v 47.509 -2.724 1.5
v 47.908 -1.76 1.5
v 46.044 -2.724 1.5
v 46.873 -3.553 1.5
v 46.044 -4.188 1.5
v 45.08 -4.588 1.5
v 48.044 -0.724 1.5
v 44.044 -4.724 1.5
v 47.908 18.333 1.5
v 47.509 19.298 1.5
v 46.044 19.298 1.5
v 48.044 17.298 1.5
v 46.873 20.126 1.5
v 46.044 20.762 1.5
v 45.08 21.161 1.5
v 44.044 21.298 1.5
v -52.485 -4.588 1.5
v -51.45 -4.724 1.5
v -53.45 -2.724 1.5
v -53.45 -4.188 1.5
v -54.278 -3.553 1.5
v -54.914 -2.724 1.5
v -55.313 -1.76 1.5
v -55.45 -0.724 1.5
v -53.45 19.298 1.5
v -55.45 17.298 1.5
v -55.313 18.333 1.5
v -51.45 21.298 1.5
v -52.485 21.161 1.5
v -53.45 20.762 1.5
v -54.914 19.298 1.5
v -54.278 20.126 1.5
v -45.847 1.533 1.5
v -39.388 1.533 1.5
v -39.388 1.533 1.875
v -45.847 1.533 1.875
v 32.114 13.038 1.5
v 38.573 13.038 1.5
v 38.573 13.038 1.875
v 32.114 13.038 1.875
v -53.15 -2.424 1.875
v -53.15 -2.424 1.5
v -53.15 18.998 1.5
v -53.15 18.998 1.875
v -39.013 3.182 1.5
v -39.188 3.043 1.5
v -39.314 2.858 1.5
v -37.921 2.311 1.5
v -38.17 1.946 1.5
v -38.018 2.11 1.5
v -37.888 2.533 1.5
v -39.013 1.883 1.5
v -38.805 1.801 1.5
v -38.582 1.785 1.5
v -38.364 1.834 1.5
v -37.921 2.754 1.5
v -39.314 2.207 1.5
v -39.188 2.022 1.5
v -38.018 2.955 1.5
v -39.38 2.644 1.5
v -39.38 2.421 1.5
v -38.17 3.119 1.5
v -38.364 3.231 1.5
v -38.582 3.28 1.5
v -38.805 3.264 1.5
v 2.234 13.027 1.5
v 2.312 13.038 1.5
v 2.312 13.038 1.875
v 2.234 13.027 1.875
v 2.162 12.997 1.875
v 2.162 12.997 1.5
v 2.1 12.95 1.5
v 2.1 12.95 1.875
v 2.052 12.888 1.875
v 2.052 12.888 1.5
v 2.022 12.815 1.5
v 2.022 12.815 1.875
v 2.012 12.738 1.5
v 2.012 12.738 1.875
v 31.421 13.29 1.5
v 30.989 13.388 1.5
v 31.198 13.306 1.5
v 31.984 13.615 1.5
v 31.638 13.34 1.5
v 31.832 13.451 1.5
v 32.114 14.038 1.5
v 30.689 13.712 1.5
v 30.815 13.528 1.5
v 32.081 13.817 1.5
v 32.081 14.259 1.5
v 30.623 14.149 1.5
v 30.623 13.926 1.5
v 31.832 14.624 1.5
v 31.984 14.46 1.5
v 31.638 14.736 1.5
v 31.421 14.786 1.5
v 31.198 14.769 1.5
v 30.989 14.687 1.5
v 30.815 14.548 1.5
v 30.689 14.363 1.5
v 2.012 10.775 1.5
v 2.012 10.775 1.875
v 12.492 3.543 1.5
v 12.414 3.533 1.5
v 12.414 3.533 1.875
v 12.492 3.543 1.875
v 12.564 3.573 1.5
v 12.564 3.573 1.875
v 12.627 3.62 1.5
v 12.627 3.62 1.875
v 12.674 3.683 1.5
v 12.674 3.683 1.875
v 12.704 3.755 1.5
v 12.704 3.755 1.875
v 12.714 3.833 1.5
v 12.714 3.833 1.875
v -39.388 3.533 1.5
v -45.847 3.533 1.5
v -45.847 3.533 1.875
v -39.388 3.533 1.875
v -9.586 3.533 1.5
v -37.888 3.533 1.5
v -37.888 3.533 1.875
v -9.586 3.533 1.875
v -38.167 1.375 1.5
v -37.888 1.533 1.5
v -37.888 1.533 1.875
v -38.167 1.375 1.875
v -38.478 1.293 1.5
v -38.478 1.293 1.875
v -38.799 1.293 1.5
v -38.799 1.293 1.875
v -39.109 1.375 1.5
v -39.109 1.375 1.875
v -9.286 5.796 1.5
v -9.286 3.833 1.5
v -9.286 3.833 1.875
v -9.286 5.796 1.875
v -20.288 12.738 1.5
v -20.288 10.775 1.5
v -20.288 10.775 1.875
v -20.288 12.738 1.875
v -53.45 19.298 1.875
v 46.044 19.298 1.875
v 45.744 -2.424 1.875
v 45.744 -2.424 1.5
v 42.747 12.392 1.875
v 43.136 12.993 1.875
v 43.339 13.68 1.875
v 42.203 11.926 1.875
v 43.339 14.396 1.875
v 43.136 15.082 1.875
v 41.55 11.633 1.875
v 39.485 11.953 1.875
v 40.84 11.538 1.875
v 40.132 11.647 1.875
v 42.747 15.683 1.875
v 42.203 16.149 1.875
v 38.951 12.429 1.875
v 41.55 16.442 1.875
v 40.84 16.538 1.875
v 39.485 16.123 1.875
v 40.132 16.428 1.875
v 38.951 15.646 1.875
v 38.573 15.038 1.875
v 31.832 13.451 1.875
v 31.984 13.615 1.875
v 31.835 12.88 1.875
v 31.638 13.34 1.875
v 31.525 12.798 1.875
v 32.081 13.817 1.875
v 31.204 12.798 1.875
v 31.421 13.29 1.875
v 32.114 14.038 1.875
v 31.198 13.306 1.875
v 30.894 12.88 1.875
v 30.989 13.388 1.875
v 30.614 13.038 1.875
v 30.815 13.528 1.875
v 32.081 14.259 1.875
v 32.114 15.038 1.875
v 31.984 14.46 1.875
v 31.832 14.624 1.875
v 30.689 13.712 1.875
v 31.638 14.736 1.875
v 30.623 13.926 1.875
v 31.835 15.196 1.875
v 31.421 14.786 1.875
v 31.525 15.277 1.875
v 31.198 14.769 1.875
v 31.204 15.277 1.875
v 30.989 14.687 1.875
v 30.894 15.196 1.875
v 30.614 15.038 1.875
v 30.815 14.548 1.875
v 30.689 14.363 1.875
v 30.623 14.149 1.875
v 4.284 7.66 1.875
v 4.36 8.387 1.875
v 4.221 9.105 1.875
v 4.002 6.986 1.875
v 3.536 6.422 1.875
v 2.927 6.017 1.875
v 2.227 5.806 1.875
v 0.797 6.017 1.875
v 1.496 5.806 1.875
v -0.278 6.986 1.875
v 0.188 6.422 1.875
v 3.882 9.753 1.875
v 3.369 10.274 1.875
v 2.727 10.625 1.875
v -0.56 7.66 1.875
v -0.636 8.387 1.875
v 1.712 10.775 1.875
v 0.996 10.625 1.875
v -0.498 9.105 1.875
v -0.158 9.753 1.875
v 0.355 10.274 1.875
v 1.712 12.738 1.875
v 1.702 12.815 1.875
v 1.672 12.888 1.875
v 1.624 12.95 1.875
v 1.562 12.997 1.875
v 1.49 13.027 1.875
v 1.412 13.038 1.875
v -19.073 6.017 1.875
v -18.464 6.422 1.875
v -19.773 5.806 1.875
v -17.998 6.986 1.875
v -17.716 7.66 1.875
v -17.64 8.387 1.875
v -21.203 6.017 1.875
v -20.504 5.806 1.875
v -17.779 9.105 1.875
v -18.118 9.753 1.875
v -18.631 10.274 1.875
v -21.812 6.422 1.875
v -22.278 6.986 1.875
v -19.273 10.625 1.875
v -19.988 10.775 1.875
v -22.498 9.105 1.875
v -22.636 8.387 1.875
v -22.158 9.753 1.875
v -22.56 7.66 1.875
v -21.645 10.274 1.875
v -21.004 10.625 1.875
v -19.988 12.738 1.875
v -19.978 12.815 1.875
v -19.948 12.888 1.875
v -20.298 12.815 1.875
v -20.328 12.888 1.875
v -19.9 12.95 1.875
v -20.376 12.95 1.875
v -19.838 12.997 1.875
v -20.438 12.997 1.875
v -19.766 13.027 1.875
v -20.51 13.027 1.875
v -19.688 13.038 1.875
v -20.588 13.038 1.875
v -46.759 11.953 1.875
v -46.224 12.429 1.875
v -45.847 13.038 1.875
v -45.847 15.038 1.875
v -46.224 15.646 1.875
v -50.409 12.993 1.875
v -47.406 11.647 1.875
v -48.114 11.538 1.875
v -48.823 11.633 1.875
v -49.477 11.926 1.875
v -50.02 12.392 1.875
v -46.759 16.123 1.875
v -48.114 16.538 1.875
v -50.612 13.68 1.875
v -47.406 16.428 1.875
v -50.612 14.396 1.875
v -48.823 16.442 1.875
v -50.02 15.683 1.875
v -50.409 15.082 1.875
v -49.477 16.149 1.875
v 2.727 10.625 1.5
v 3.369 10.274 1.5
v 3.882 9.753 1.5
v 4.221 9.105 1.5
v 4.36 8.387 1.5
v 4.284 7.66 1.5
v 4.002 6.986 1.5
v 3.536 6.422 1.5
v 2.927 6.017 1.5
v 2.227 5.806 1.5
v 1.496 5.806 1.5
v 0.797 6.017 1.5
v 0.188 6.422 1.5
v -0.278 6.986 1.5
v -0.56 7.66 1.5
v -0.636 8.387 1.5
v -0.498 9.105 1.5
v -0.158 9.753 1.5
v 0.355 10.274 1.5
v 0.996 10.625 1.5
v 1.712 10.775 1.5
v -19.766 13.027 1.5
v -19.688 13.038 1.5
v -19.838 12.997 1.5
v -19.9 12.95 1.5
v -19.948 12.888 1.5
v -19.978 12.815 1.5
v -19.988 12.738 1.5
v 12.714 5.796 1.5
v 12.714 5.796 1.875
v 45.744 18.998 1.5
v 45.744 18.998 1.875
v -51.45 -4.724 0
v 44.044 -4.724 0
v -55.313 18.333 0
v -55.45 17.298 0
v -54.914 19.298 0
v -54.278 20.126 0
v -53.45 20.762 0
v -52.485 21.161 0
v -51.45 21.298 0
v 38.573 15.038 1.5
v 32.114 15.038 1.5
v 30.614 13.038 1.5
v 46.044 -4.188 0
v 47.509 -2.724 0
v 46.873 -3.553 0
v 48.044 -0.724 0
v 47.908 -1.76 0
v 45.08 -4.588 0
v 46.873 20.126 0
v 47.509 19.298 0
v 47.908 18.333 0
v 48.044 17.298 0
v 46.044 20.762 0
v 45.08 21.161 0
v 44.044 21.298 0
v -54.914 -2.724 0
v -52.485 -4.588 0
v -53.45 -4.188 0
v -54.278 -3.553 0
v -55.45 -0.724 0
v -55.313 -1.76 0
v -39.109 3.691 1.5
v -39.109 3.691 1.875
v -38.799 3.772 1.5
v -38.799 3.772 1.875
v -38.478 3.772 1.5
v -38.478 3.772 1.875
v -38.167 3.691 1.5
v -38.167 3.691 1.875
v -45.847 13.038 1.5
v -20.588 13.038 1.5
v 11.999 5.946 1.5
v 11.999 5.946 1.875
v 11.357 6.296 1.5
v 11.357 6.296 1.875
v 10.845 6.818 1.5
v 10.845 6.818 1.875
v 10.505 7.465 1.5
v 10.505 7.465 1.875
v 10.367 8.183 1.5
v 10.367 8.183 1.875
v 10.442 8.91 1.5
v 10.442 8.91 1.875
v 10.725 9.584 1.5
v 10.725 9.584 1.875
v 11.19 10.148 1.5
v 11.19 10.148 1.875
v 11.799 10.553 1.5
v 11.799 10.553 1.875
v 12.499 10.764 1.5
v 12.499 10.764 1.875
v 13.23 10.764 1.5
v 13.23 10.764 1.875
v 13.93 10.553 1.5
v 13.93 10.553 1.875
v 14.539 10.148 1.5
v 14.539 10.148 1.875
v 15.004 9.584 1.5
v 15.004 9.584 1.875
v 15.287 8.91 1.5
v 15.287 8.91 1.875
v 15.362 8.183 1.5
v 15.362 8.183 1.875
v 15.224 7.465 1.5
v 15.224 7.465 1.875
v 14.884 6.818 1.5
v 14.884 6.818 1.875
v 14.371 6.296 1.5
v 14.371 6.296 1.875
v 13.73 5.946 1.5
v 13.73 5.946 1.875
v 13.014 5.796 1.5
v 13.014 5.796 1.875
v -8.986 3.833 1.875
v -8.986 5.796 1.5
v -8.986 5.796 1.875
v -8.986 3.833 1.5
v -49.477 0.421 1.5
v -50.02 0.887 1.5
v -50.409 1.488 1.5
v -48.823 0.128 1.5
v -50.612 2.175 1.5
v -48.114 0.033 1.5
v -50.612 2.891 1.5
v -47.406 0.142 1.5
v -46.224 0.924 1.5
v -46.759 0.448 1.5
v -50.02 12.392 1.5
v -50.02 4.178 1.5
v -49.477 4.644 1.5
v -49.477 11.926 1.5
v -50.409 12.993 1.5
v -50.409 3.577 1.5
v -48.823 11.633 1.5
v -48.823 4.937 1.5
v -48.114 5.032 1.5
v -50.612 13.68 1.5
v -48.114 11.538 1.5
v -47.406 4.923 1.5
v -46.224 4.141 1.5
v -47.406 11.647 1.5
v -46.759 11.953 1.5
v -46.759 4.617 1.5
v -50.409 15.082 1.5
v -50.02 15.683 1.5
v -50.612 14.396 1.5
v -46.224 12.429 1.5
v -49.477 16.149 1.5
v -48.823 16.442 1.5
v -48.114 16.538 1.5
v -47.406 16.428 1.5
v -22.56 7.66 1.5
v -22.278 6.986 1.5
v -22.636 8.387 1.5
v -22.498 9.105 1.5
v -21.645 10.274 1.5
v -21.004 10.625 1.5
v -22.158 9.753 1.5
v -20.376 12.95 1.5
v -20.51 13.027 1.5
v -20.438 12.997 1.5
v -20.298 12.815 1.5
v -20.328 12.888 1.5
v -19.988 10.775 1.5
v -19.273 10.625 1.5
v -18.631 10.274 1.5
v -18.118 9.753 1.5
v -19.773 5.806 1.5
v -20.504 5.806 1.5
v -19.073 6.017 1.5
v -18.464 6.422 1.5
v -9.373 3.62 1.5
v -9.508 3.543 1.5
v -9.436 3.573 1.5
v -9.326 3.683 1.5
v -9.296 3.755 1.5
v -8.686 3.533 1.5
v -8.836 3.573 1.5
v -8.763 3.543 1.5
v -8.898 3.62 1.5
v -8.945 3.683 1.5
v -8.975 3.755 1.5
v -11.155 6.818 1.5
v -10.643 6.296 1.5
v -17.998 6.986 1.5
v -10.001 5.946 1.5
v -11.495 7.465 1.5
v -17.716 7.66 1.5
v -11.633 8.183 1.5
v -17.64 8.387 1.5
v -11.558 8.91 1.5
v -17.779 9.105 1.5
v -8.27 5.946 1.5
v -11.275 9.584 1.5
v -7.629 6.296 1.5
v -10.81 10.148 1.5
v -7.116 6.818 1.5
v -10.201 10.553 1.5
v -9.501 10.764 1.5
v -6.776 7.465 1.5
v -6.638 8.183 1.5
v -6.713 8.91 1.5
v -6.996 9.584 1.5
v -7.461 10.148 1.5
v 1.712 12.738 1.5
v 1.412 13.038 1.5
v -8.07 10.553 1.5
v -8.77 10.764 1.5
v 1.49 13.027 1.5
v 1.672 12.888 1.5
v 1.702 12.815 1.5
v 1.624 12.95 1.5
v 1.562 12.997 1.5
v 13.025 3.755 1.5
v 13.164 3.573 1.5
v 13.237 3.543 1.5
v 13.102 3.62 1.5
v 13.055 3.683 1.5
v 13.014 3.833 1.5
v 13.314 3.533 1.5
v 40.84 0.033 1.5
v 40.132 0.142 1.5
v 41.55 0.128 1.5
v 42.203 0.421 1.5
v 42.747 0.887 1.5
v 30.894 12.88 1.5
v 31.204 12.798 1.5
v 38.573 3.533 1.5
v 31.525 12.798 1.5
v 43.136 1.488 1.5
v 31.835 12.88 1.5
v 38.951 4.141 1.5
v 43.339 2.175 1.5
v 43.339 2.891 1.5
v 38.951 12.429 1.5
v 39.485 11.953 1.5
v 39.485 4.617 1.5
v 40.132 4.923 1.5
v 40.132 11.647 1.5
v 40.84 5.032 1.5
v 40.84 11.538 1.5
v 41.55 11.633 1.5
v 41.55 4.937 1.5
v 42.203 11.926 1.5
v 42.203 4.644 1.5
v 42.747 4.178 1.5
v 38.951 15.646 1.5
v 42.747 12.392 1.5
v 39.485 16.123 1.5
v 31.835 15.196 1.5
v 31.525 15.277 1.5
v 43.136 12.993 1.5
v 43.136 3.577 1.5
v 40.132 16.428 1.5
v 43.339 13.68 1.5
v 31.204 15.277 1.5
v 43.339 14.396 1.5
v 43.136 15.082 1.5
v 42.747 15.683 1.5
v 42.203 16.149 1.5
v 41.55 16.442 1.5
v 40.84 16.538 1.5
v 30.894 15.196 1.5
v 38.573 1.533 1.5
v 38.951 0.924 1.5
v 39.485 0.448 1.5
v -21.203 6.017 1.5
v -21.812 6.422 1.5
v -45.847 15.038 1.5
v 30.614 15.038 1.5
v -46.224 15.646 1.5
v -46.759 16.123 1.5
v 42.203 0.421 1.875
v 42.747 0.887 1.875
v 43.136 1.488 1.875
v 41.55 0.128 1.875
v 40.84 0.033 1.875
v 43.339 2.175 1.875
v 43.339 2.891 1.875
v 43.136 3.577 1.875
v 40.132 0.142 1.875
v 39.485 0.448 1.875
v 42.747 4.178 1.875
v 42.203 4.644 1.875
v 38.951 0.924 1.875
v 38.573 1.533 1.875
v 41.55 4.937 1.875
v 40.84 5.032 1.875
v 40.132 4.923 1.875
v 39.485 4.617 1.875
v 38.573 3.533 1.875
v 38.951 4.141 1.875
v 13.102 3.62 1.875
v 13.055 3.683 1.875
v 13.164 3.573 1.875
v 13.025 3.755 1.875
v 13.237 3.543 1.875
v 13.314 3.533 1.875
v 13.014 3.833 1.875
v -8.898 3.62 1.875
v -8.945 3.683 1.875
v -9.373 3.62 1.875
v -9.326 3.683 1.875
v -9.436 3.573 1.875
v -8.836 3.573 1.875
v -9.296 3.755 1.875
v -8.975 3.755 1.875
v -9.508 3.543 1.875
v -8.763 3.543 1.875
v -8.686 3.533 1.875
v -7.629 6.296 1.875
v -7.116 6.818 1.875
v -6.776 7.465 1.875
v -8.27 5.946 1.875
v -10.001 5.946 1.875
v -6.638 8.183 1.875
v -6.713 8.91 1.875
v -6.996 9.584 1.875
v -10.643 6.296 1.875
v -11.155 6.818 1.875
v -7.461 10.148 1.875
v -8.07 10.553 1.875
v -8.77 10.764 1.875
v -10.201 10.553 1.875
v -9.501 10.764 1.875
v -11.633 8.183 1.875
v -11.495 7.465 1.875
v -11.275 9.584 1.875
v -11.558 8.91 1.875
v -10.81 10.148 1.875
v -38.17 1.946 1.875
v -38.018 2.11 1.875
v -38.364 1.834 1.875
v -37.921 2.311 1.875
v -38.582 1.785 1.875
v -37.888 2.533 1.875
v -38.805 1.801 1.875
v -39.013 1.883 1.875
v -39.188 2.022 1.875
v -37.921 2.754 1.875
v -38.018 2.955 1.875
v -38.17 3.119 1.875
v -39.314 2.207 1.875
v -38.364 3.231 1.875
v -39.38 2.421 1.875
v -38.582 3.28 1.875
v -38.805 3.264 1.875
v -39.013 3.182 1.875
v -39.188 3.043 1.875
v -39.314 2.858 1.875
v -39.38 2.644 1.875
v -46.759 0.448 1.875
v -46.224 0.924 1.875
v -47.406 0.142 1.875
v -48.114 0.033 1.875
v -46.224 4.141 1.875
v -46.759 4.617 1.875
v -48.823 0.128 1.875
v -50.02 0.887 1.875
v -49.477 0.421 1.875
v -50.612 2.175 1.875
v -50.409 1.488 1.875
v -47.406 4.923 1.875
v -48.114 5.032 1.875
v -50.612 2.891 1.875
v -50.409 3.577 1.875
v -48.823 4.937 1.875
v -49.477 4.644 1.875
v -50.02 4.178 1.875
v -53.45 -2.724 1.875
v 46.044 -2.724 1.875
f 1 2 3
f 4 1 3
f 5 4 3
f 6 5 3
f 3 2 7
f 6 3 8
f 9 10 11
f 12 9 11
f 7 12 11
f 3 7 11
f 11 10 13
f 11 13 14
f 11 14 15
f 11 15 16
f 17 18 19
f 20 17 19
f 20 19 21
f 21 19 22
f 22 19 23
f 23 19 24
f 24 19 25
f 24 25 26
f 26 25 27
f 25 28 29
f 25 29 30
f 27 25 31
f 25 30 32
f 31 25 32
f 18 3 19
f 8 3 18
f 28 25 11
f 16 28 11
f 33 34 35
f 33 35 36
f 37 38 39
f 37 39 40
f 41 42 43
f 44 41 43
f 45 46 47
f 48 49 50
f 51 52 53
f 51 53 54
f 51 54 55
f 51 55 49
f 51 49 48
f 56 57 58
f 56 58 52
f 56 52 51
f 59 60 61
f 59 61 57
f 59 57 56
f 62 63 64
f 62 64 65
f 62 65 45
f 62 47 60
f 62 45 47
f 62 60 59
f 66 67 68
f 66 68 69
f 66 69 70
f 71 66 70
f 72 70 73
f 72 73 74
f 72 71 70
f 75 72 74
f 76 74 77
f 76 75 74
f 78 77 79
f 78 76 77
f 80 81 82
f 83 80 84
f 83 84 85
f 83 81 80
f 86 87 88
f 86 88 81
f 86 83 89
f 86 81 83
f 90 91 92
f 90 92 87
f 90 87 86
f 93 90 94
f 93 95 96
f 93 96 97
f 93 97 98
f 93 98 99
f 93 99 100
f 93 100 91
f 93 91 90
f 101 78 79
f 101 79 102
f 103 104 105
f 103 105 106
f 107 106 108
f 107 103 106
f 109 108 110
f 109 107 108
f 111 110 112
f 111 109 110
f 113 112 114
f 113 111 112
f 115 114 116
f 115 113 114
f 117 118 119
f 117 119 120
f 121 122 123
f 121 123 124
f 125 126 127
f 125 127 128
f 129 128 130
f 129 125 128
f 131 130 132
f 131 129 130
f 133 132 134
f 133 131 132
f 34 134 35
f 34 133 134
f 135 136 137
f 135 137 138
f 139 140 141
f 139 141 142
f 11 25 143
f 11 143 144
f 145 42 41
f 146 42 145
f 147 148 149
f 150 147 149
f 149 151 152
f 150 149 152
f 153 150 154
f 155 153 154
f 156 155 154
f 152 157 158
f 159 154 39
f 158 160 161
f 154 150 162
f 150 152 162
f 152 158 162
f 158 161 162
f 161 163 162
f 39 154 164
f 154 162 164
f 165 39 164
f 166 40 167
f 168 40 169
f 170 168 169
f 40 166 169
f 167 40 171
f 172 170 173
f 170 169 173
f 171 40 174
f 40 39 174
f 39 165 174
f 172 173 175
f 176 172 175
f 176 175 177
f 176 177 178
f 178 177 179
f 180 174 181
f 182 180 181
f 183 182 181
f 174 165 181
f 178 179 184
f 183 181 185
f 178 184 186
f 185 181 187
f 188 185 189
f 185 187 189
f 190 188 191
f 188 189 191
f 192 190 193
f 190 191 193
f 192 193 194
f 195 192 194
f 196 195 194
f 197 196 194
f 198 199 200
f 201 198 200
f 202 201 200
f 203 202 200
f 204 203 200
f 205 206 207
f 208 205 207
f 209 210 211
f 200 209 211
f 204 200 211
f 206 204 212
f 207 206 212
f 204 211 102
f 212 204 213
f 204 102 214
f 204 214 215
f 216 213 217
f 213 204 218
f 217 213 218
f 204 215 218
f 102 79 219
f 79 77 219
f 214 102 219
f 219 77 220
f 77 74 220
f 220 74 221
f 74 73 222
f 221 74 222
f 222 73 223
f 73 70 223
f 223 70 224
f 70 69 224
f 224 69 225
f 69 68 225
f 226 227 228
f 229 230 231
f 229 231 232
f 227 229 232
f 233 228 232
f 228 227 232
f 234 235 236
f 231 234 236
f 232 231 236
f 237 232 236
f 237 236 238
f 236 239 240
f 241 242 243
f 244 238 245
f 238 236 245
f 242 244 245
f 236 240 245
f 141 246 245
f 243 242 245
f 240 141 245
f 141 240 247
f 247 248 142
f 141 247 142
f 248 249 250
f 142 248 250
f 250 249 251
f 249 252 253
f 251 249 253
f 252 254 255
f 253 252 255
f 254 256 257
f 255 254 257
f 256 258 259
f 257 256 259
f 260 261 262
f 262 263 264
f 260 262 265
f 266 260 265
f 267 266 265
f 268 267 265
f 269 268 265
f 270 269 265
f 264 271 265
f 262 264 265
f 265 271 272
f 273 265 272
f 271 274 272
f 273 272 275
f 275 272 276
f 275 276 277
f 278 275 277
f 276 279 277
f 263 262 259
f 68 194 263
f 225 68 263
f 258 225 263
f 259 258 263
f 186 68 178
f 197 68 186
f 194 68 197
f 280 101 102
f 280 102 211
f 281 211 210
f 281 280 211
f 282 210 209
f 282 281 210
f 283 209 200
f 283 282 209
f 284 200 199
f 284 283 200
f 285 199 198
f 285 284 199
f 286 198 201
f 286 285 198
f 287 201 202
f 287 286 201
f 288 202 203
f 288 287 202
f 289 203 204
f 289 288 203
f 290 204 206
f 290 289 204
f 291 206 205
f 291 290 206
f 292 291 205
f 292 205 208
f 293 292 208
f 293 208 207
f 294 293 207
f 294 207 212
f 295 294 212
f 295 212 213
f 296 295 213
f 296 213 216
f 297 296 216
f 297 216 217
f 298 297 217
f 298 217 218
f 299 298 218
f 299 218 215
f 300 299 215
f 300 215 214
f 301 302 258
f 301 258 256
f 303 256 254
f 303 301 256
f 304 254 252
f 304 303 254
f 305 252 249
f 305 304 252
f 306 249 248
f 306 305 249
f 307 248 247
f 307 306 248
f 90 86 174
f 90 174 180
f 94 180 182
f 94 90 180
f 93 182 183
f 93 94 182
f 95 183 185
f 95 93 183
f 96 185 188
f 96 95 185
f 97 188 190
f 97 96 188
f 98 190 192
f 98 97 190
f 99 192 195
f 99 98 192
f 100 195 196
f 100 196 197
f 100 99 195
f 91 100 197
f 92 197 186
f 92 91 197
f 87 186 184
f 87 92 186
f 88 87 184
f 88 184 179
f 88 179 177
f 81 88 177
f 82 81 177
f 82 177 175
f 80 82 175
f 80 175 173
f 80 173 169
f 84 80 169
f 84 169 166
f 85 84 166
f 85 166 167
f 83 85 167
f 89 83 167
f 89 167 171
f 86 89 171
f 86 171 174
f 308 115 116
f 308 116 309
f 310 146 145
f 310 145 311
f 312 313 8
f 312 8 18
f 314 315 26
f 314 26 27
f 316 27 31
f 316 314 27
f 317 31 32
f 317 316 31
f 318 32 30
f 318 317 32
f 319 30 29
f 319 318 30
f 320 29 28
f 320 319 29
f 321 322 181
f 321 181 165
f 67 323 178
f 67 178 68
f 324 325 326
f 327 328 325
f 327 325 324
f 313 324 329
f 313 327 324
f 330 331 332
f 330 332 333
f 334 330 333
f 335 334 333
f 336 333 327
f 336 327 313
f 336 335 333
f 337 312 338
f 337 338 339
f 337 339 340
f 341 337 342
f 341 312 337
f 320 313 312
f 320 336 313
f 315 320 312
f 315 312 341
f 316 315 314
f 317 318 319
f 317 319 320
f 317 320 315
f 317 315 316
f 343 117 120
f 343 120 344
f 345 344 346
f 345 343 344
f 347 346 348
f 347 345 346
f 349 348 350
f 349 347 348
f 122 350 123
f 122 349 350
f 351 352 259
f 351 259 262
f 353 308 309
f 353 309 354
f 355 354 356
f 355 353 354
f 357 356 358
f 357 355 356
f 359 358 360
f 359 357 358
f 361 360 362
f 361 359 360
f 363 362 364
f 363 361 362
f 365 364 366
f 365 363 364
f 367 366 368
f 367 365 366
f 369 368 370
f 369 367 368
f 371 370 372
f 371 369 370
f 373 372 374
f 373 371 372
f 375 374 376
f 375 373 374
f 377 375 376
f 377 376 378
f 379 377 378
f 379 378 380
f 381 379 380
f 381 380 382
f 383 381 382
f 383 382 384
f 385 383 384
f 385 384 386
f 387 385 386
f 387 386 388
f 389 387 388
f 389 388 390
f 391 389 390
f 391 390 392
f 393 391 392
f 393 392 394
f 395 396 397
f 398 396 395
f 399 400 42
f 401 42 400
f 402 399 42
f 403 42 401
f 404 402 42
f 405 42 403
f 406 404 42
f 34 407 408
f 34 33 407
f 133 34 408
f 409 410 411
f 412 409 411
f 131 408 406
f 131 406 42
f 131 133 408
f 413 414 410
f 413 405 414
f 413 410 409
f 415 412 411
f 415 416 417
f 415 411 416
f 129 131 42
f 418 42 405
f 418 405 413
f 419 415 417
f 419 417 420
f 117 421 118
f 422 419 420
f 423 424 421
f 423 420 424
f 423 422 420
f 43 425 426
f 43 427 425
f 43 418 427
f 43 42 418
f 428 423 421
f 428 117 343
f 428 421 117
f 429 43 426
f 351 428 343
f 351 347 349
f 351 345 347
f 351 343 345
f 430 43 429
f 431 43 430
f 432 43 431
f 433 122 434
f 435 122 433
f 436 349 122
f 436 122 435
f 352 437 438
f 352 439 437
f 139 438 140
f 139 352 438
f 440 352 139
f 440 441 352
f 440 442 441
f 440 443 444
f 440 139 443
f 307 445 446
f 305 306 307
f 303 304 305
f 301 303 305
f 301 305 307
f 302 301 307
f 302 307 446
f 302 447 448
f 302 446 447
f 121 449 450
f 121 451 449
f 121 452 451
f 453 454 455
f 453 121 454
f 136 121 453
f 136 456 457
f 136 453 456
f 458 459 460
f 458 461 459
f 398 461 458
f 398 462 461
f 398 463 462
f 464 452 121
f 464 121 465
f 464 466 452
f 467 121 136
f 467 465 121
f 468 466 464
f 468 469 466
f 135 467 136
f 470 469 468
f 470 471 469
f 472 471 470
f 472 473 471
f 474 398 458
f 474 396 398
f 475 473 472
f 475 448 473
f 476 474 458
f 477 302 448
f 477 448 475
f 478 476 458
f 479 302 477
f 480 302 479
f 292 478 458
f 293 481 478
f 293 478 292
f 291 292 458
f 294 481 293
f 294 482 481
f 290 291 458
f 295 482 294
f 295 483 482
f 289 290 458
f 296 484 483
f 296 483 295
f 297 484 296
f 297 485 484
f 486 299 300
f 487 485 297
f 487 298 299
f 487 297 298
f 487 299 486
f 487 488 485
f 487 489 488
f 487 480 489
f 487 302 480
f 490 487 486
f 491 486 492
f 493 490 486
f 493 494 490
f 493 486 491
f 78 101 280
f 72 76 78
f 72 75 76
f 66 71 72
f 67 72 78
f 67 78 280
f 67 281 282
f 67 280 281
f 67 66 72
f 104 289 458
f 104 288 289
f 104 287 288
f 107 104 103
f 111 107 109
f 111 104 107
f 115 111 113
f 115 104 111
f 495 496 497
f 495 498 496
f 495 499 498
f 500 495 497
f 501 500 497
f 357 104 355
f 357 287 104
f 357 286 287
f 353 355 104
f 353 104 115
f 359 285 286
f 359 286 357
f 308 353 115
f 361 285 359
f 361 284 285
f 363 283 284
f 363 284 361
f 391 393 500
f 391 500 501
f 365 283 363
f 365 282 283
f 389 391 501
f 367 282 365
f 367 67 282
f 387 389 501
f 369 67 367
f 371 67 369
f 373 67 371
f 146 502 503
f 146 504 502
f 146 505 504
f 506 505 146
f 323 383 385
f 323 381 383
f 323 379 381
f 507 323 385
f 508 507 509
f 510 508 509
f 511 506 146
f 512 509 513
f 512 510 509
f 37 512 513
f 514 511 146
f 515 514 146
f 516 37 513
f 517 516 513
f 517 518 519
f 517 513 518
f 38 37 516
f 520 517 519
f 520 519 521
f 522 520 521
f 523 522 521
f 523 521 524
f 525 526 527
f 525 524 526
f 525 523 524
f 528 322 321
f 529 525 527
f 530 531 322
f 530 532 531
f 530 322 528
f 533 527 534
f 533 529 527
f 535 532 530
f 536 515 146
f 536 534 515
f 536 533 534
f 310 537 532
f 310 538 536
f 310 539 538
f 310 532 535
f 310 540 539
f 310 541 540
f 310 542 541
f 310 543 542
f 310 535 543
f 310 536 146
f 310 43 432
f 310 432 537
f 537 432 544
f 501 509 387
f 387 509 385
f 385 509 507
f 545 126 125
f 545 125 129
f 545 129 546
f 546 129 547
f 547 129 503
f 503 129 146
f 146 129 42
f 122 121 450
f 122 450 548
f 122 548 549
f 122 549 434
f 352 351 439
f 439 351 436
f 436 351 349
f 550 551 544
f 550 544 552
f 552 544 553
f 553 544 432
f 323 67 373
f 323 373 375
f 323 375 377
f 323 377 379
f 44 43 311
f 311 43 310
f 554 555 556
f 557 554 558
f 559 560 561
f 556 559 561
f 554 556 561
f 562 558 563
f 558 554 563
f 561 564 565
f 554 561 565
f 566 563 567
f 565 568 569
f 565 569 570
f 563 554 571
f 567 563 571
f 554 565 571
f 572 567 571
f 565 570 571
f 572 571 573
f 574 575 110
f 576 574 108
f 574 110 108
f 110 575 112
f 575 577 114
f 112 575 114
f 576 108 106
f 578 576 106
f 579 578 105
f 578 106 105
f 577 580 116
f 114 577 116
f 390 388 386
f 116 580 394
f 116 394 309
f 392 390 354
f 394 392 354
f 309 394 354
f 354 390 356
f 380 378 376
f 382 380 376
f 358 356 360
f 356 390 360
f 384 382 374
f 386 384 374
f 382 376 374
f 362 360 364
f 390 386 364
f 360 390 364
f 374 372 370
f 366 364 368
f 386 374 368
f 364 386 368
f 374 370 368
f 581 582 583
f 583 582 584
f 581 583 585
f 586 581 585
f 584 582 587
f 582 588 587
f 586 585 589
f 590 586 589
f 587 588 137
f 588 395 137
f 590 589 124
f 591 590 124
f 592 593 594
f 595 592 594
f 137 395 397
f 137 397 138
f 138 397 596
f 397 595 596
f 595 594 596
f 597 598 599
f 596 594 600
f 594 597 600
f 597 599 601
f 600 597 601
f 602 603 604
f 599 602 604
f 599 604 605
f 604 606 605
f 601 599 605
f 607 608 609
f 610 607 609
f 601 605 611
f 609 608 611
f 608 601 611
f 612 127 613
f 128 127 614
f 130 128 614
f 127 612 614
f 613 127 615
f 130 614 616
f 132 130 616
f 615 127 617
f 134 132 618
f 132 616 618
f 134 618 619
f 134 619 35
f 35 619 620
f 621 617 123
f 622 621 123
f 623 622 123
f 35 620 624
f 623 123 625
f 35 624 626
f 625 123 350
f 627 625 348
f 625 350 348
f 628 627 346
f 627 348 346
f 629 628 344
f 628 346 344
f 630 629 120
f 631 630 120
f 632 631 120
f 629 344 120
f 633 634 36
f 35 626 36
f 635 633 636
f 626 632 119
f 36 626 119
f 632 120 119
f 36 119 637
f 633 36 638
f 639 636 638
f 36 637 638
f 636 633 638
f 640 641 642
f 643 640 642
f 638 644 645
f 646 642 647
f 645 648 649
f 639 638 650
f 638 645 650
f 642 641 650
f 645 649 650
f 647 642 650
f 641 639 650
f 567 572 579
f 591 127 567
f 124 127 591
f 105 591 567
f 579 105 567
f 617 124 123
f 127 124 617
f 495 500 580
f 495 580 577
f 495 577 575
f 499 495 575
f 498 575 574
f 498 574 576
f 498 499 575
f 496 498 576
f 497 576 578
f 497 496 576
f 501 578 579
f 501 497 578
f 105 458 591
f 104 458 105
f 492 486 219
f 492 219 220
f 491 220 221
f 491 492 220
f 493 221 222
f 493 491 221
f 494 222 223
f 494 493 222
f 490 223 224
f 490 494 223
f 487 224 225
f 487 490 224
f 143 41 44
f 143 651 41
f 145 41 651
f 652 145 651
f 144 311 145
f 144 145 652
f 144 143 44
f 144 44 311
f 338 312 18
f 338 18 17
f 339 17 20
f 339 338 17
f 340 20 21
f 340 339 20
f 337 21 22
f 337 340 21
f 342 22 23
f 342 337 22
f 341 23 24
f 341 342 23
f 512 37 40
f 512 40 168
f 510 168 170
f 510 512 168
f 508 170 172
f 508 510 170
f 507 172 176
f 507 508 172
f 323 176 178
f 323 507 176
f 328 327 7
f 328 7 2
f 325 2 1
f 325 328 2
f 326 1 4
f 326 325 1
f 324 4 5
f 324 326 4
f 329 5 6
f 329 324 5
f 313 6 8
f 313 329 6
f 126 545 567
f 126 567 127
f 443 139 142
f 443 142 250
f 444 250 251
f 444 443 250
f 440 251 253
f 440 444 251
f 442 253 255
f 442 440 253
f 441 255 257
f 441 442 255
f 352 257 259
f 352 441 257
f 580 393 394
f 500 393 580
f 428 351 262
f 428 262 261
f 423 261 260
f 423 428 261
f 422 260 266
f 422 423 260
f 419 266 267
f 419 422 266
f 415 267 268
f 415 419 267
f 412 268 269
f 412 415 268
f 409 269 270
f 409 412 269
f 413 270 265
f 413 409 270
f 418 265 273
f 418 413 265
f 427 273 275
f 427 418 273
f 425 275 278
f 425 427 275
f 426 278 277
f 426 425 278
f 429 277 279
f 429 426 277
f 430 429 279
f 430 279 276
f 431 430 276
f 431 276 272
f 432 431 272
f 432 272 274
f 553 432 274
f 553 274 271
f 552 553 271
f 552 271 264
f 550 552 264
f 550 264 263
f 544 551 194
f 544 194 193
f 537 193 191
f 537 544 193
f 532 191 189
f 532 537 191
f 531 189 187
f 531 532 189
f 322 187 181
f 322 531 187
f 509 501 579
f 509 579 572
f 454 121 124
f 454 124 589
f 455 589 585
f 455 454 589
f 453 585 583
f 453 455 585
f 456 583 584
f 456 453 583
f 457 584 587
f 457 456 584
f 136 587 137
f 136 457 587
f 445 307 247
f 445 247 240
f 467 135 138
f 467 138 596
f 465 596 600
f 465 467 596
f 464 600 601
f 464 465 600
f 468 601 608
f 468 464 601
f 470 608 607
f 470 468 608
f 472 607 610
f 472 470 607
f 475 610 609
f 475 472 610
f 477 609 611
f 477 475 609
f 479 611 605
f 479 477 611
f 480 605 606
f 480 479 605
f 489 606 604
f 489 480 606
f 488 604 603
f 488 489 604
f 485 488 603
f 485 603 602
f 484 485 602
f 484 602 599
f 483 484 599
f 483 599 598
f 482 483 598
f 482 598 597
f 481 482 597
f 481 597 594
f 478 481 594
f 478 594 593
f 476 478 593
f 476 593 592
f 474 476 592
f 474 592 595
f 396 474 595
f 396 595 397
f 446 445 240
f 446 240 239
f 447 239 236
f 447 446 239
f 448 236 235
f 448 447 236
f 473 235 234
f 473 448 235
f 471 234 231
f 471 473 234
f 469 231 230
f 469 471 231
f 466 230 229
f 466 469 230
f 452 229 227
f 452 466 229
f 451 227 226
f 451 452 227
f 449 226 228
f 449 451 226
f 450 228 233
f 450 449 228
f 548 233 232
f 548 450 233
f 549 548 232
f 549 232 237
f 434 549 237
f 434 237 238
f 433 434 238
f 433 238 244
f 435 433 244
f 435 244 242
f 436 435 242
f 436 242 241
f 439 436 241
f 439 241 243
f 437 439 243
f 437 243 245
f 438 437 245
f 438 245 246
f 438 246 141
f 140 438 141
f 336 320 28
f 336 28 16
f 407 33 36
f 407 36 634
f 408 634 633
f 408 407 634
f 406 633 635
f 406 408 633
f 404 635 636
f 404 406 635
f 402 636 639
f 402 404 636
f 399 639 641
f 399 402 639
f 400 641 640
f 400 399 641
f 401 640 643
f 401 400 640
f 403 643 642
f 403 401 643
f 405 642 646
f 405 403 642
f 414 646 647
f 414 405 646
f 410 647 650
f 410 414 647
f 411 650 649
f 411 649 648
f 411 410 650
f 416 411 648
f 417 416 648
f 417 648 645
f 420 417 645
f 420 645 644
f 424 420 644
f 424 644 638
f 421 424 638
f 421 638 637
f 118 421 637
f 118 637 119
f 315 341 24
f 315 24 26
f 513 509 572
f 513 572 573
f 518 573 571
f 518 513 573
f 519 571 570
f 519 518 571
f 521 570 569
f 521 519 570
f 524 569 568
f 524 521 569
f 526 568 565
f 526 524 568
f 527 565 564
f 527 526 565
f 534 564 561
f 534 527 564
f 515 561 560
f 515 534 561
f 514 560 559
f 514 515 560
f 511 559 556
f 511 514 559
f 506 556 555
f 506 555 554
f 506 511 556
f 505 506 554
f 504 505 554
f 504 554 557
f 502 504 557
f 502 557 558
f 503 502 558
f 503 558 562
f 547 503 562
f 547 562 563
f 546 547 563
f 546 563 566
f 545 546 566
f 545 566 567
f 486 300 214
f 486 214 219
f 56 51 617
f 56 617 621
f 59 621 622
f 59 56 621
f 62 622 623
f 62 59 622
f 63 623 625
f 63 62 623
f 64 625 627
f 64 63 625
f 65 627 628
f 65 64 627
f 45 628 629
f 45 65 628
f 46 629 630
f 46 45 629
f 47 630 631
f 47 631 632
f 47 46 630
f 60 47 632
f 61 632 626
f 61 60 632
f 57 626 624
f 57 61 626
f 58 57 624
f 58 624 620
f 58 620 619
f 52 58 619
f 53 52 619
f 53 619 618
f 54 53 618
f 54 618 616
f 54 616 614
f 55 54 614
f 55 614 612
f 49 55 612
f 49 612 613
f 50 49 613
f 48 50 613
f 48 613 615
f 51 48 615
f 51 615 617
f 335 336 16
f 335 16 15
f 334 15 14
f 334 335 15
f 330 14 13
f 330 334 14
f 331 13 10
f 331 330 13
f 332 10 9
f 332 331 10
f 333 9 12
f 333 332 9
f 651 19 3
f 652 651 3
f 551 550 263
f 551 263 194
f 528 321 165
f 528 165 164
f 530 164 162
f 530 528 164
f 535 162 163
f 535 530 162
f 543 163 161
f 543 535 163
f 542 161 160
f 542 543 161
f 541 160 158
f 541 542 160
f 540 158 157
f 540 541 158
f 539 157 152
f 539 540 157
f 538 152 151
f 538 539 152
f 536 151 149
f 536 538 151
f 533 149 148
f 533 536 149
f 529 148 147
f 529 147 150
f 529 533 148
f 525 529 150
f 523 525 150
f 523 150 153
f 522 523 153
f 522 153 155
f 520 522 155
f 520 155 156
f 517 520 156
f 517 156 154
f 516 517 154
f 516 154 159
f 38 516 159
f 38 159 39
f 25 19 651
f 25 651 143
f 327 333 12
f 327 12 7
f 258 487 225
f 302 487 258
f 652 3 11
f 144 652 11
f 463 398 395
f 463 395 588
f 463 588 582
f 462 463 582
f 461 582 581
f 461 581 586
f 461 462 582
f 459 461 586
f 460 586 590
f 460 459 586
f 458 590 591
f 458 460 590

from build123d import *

# Parameters (mm, degrees)
SKETCH1_W             = 98.893995825
SKETCH1_H             = 21.421924981
BOSS_EXTRUDE1_DEPTH   = 1.5
SKETCH1_R             = 0.75
BOSS_EXTRUDE1_2_DEPTH = 1.5
BOSS_EXTRUDE1_3_DEPTH = 1.5
SKETCH1_9_R           = 0.75
BOSS_EXTRUDE2_DEPTH   = 1.875
SKETCH1_10_W          = 99.493995825
SKETCH1_10_H          = 22.021924981
SKETCH1_10_W_2        = 98.893995825
SKETCH1_10_H_2        = 21.421924981
BOSS_EXTRUDE3_DEPTH   = 1.875
SKETCH1_11_W          = 99.493995825
SKETCH1_11_H          = 22.021924981
BOSS_EXTRUDE4_DEPTH   = 1.5


with BuildPart() as part:
    # Sketch1 → Boss-Extrude1 (new body)
    with BuildSketch(Plane.XY):
        with Locations((-3.702524559, 8.286725718)):
            Rectangle(SKETCH1_W, SKETCH1_H)
        with BuildLine():
            ThreePointArc((2.011897659, 12.737688209), (2.099765624, 12.949820243), (2.311897659, 13.037688209))
            Line((2.311897659, 13.037688209), (30.614473354, 13.037688209))
            ThreePointArc((30.614473354, 13.037688209), (31.364473354, 12.787688209), (32.114473354, 13.037688209))
            Line((32.114473354, 13.037688209), (38.573185506, 13.037688209))
            ThreePointArc((38.573185506, 13.037688209), (43.364473354, 14.037688209), (38.573185506, 15.037688209))
            Line((38.573185506, 15.037688209), (32.114473354, 15.037688209))
            ThreePointArc((32.114473354, 15.037688209), (31.364473354, 15.287688209), (30.614473354, 15.037688209))
            Line((30.614473354, 15.037688209), (-45.846814494, 15.037688209))
            ThreePointArc((-45.846814494, 15.037688209), (-50.638102341, 14.037688209), (-45.846814494, 13.037688209))
            Line((-45.846814494, 13.037688209), (-20.588102341, 13.037688209))
            ThreePointArc((-20.588102341, 13.037688209), (-20.375970307, 12.949820243), (-20.288102341, 12.737688209))
            Line((-20.288102341, 12.737688209), (-20.288102341, 10.774606087))
            ThreePointArc((-20.288102341, 10.774606087), (-20.138102341, 5.779110144), (-19.988102341, 10.774606087))
            Line((-19.988102341, 10.774606087), (-19.988102341, 12.737688209))
            ThreePointArc((-19.988102341, 12.737688209), (-19.900234376, 12.949820243), (-19.688102341, 13.037688209))
            Line((-19.688102341, 13.037688209), (1.411897659, 13.037688209))
            ThreePointArc((1.411897659, 13.037688209), (1.624029693, 12.949820243), (1.711897659, 12.737688209))
            Line((1.711897659, 12.737688209), (1.711897659, 10.774606087))
            ThreePointArc((1.711897659, 10.774606087), (1.861897659, 5.779110144), (2.011897659, 10.774606087))
            Line((2.011897659, 10.774606087), (2.011897659, 12.737688209))
        make_face(mode=Mode.SUBTRACT)
        with BuildLine():
            Line((13.014473354, 3.832527843), (13.014473354, 5.795609965))
            ThreePointArc((13.014473354, 5.795609965), (12.864473354, 10.791105907), (12.714473354, 5.795609965))
            Line((12.714473354, 5.795609965), (12.714473354, 3.832527843))
            ThreePointArc((12.714473354, 3.832527843), (12.626605388, 3.620395809), (12.414473354, 3.532527843))
            Line((12.414473354, 3.532527843), (-8.685526646, 3.532527843))
            ThreePointArc((-8.685526646, 3.532527843), (-8.897658681, 3.620395809), (-8.985526646, 3.832527843))
            Line((-8.985526646, 3.832527843), (-8.985526646, 5.795609965))
            ThreePointArc((-8.985526646, 5.795609965), (-9.135526646, 10.791105907), (-9.285526646, 5.795609965))
            Line((-9.285526646, 5.795609965), (-9.285526646, 3.832527843))
            ThreePointArc((-9.285526646, 3.832527843), (-9.373394612, 3.620395809), (-9.585526646, 3.532527843))
            Line((-9.585526646, 3.532527843), (-37.888102341, 3.532527843))
            ThreePointArc((-37.888102341, 3.532527843), (-38.638102341, 3.782527843), (-39.388102341, 3.532527843))
            Line((-39.388102341, 3.532527843), (-45.846814494, 3.532527843))
            ThreePointArc((-45.846814494, 3.532527843), (-50.638102341, 2.532527843), (-45.846814494, 1.532527843))
            Line((-45.846814494, 1.532527843), (-39.388102341, 1.532527843))
            ThreePointArc((-39.388102341, 1.532527843), (-38.638102341, 1.282527843), (-37.888102341, 1.532527843))
            Line((-37.888102341, 1.532527843), (38.573185506, 1.532527843))
            ThreePointArc((38.573185506, 1.532527843), (43.364473354, 2.532527843), (38.573185506, 3.532527843))
            Line((38.573185506, 3.532527843), (13.314473354, 3.532527843))
            ThreePointArc((13.314473354, 3.532527843), (13.102341319, 3.620395809), (13.014473354, 3.832527843))
        make_face(mode=Mode.SUBTRACT)
    extrude(amount=BOSS_EXTRUDE1_DEPTH)



with BuildPart() as body_2:
    # Sketch1 → Boss-Extrude1 2 (new body)
    with BuildSketch(Plane.XY):
        with Locations((31.364473354, 14.037688209)):
            Circle(SKETCH1_R)
    extrude(amount=BOSS_EXTRUDE1_2_DEPTH)


with BuildPart() as body_3:
    # Sketch1 → Boss-Extrude1 3 (new body)
    with BuildSketch(Plane.XY):
        with Locations((-38.638102341, 2.532527843)):
            Circle(SKETCH1_R)
    extrude(amount=BOSS_EXTRUDE1_3_DEPTH)


with BuildPart() as part_1:
    add(part.part)

    add(body_2.part)  # Boss-Extrude2 merges body 2

    add(body_3.part)  # Boss-Extrude2 merges body 3
    # Sketch1_9 → Boss-Extrude2 (add)
    with BuildSketch(Plane.XY):
        with BuildLine():
            Line((2.011897659, 12.737688209), (2.011897659, 10.774606087))
            ThreePointArc((2.011897659, 10.774606087), (1.861897659, 5.779110144), (1.711897659, 10.774606087))
            Line((1.711897659, 10.774606087), (1.711897659, 12.737688209))
            ThreePointArc((1.711897659, 12.737688209), (1.624029693, 12.949820243), (1.411897659, 13.037688209))
            Line((1.411897659, 13.037688209), (-19.688102341, 13.037688209))
            ThreePointArc((-19.688102341, 13.037688209), (-19.900234376, 12.949820243), (-19.988102341, 12.737688209))
            Line((-19.988102341, 12.737688209), (-19.988102341, 10.774606087))
            ThreePointArc((-19.988102341, 10.774606087), (-20.138102341, 5.779110144), (-20.288102341, 10.774606087))
            Line((-20.288102341, 10.774606087), (-20.288102341, 12.737688209))
            ThreePointArc((-20.288102341, 12.737688209), (-20.375970307, 12.949820243), (-20.588102341, 13.037688209))
            Line((-20.588102341, 13.037688209), (-45.846814494, 13.037688209))
            ThreePointArc((-45.846814494, 13.037688209), (-50.638102341, 14.037688209), (-45.846814494, 15.037688209))
            Line((-45.846814494, 15.037688209), (30.614473354, 15.037688209))
            ThreePointArc((30.614473354, 15.037688209), (31.364473354, 15.287688209), (32.114473354, 15.037688209))
            Line((32.114473354, 15.037688209), (38.573185506, 15.037688209))
            ThreePointArc((38.573185506, 15.037688209), (43.364473354, 14.037688209), (38.573185506, 13.037688209))
            Line((38.573185506, 13.037688209), (32.114473354, 13.037688209))
            ThreePointArc((32.114473354, 13.037688209), (31.364473354, 12.787688209), (30.614473354, 13.037688209))
            Line((30.614473354, 13.037688209), (2.311897659, 13.037688209))
            ThreePointArc((2.311897659, 13.037688209), (2.099765624, 12.949820243), (2.011897659, 12.737688209))
        make_face()
        with Locations((31.364473354, 14.037688209)):
            Circle(SKETCH1_9_R, mode=Mode.SUBTRACT)
        with BuildLine():
            ThreePointArc((13.014473354, 3.832527843), (13.102341319, 3.620395809), (13.314473354, 3.532527843))
            Line((13.314473354, 3.532527843), (38.573185506, 3.532527843))
            ThreePointArc((38.573185506, 3.532527843), (43.364473354, 2.532527843), (38.573185506, 1.532527843))
            Line((38.573185506, 1.532527843), (-37.888102341, 1.532527843))
            ThreePointArc((-37.888102341, 1.532527843), (-38.638102341, 1.282527843), (-39.388102341, 1.532527843))
            Line((-39.388102341, 1.532527843), (-45.846814494, 1.532527843))
            ThreePointArc((-45.846814494, 1.532527843), (-50.638102341, 2.532527843), (-45.846814494, 3.532527843))
            Line((-45.846814494, 3.532527843), (-39.388102341, 3.532527843))
            ThreePointArc((-39.388102341, 3.532527843), (-38.638102341, 3.782527843), (-37.888102341, 3.532527843))
            Line((-37.888102341, 3.532527843), (-9.585526646, 3.532527843))
            ThreePointArc((-9.585526646, 3.532527843), (-9.373394612, 3.620395809), (-9.285526646, 3.832527843))
            Line((-9.285526646, 3.832527843), (-9.285526646, 5.795609965))
            ThreePointArc((-9.285526646, 5.795609965), (-9.135526646, 10.791105907), (-8.985526646, 5.795609965))
            Line((-8.985526646, 5.795609965), (-8.985526646, 3.832527843))
            ThreePointArc((-8.985526646, 3.832527843), (-8.897658681, 3.620395809), (-8.685526646, 3.532527843))
            Line((-8.685526646, 3.532527843), (12.414473354, 3.532527843))
            ThreePointArc((12.414473354, 3.532527843), (12.626605388, 3.620395809), (12.714473354, 3.832527843))
            Line((12.714473354, 3.832527843), (12.714473354, 5.795609965))
            ThreePointArc((12.714473354, 5.795609965), (12.864473354, 10.791105907), (13.014473354, 5.795609965))
            Line((13.014473354, 5.795609965), (13.014473354, 3.832527843))
        make_face()
        with Locations((-38.638102341, 2.532527843)):
            Circle(SKETCH1_9_R, mode=Mode.SUBTRACT)
    extrude(amount=BOSS_EXTRUDE2_DEPTH)

    # Sketch1_10 → Boss-Extrude3 (add)
    with BuildSketch(Plane.XY):
        with Locations((-3.702524558, 8.286725718)):
            Rectangle(SKETCH1_10_W, SKETCH1_10_H)
        with Locations((-3.702524559, 8.286725718)):
            Rectangle(SKETCH1_10_W_2, SKETCH1_10_H_2, mode=Mode.SUBTRACT)
    extrude(amount=BOSS_EXTRUDE3_DEPTH)

    # Sketch1_11 → Boss-Extrude4 (add)
    with BuildSketch(Plane.XY):
        with BuildLine():
            ThreePointArc((-55.449522471, 17.297688209), (-54.277949596, 20.126115333), (-51.449522471, 21.297688209))
            Line((-51.449522471, 21.297688209), (44.044473354, 21.297688209))
            ThreePointArc((44.044473354, 21.297688209), (46.872900478, 20.126115333), (48.044473354, 17.297688209))
            Line((48.044473354, 17.297688209), (48.044473354, -0.724236772))
            ThreePointArc((48.044473354, -0.724236772), (46.872900478, -3.552663897), (44.044473354, -4.724236772))
            Line((44.044473354, -4.724236772), (-51.449522471, -4.724236772))
            ThreePointArc((-51.449522471, -4.724236772), (-54.277949596, -3.552663897), (-55.449522471, -0.724236772))
            Line((-55.449522471, -0.724236772), (-55.449522471, 17.297688209))
        make_face()
        with Locations((-3.702524558, 8.286725718)):
            Rectangle(SKETCH1_11_W, SKETCH1_11_H, mode=Mode.SUBTRACT)
    extrude(amount=BOSS_EXTRUDE4_DEPTH)


solid = part_1.part
